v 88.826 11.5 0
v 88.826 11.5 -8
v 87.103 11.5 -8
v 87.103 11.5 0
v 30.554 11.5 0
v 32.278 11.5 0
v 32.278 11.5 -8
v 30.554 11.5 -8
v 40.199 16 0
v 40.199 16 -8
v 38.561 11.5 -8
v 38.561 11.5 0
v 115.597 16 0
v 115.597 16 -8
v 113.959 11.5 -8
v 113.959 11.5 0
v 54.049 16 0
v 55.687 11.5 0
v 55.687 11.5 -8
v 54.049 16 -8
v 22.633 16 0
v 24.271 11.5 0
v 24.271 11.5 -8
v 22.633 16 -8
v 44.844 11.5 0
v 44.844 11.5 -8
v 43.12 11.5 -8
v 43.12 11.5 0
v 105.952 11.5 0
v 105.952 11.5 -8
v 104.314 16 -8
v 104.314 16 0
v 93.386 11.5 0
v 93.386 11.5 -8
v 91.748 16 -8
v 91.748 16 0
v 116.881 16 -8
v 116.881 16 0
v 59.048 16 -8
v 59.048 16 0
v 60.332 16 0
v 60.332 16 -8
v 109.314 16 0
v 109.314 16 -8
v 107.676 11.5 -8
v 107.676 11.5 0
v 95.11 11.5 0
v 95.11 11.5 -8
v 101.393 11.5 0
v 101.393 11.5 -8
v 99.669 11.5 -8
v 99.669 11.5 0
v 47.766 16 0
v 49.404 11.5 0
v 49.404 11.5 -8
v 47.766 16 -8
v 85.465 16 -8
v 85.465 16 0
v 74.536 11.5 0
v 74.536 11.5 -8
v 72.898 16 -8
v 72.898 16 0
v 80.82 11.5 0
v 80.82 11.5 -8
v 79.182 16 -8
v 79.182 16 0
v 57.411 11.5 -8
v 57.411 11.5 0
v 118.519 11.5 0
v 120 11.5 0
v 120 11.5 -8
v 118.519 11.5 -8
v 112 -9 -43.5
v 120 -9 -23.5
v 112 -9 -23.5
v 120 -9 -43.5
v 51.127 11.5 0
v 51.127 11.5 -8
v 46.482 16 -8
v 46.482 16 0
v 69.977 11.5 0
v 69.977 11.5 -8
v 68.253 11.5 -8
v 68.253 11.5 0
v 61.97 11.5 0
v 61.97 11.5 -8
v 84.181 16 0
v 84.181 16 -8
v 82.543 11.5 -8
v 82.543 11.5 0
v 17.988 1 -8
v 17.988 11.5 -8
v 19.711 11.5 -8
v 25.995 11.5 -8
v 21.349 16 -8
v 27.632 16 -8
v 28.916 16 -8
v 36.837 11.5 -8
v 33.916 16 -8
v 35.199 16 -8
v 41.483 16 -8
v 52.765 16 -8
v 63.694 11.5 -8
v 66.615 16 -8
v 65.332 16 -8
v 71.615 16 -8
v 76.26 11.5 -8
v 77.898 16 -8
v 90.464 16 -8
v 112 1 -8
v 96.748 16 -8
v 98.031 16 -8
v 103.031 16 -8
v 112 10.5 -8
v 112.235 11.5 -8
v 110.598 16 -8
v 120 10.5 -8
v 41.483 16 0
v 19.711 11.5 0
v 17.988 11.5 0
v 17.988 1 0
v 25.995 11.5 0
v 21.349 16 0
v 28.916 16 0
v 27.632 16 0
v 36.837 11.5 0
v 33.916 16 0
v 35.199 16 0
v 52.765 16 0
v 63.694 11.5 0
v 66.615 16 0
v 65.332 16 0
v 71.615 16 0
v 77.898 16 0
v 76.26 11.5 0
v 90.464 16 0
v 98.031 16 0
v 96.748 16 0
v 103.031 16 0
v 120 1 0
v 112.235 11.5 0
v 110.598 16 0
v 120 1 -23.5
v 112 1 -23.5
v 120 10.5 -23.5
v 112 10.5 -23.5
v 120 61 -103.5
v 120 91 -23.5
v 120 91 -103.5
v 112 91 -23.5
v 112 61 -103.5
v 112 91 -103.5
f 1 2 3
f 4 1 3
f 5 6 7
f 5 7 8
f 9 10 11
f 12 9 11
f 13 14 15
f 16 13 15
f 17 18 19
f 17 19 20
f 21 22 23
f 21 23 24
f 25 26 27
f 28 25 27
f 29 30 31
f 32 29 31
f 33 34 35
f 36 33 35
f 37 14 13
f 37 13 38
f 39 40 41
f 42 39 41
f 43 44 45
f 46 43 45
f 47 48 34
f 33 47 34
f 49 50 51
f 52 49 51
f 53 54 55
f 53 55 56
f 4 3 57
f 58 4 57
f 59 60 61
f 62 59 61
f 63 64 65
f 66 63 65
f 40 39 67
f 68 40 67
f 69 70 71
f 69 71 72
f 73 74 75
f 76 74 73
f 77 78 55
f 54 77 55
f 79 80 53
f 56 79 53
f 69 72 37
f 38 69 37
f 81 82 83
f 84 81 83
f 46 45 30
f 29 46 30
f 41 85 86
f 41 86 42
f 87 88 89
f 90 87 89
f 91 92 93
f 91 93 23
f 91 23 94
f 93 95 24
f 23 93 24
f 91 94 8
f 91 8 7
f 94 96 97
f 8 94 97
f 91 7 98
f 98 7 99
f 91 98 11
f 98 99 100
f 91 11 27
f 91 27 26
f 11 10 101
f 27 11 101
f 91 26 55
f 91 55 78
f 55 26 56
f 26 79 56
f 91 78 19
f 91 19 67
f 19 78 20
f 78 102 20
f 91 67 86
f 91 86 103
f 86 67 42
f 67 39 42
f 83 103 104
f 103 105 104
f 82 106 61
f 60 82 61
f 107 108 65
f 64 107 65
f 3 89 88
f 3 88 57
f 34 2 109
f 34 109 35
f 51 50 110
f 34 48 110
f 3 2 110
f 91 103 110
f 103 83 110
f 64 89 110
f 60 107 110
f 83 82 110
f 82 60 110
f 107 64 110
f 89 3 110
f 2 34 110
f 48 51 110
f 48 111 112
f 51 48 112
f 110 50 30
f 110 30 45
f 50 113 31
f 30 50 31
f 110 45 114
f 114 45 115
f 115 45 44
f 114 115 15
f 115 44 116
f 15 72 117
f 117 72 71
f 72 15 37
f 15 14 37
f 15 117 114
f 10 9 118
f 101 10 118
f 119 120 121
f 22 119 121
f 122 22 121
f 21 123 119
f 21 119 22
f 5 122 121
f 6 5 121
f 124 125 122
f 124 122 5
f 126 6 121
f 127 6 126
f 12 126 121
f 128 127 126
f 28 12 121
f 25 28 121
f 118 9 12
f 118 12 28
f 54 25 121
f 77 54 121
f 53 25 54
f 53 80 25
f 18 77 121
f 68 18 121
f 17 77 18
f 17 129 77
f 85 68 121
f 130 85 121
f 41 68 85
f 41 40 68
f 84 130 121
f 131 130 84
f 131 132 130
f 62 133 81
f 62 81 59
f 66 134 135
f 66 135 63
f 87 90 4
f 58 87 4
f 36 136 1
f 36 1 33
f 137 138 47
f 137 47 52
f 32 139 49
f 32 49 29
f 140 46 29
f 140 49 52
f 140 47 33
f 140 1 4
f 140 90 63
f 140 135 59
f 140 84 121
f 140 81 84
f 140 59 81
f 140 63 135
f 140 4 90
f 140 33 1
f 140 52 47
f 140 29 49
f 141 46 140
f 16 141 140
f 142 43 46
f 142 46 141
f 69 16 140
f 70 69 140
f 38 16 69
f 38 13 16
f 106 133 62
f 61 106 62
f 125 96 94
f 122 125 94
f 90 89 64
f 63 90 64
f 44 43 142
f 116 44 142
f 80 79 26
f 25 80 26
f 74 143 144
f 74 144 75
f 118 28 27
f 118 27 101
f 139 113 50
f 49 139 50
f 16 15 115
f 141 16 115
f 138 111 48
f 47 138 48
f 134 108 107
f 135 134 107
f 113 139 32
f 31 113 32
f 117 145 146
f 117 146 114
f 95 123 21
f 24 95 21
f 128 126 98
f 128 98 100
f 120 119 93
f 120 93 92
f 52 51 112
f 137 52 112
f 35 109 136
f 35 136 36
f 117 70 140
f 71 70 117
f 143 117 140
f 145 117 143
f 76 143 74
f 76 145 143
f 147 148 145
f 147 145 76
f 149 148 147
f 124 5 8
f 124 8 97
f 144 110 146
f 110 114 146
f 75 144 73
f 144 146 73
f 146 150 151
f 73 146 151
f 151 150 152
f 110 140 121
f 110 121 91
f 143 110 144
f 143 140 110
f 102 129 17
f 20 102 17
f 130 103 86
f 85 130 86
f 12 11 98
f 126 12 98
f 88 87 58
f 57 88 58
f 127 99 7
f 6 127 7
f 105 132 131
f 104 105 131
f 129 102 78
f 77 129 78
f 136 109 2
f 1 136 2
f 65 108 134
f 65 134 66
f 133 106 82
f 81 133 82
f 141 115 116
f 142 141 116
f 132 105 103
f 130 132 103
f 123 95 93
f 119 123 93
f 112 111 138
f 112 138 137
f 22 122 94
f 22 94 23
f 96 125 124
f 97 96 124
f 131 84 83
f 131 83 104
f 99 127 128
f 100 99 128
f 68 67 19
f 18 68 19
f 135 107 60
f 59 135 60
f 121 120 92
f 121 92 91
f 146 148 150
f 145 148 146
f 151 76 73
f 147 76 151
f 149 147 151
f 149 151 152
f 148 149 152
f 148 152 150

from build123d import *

# Parameters (mm, degrees)
BLANKSKE_W          = 120
BLANKSKE_H          = 16
BLANK_DEPTH         = 8
TOOTHCUTSIM_DEPTH   = 122.326007105
TEETHCUTS_COUNT     = 20
TEETHCUTS_PITCH     = 6.2831853
SKETCH1_W           = 8
SKETCH1_H           = 1
CUT_EXTRUDE1_DEPTH  = 122.326007105
BOSS_EXTRUDE2_DEPTH = 8
CUT_EXTRUDE2_DEPTH  = 183.738200713


with BuildPart() as part:
    # BlankSke → Blank (new body)
    with BuildSketch(Plane.XY):
        with Locations((60, 8)):
            Rectangle(BLANKSKE_W, BLANKSKE_H)
    extrude(amount=-BLANK_DEPTH)

    # TooCutSkeSim → ToothCutSim (cut, through all)
    with BuildSketch(Plane.XY):
        Polygon((0.861870739, 11.5), (-0.861870739, 11.5), (-2.508981637, 16.0254), (2.508981637, 16.0254), align=None)
    toothcutsim = extrude(amount=-TOOTHCUTSIM_DEPTH, mode=Mode.SUBTRACT)

    # TeethCuts: ToothCutSim ×20
    with Locations(*[(i * TEETHCUTS_PITCH, 0, 0) for i in range(1, TEETHCUTS_COUNT)]):
        add(toothcutsim, mode=Mode.SUBTRACT)

    # Sketch1 → Cut-Extrude1 (cut, through all)
    with BuildSketch(Plane(origin=(120, 0, 0), x_dir=(0, 0, -1), z_dir=(1, 0, 0))):
        with Locations((4, 0.5)):
            Rectangle(SKETCH1_W, SKETCH1_H)
    extrude(amount=-CUT_EXTRUDE1_DEPTH, mode=Mode.SUBTRACT)

    # Sketch2 → Boss-Extrude2 (add)
    with BuildSketch(Plane(origin=(120, 0, 0), x_dir=(0, 0, -1), z_dir=(1, 0, 0))):
        Polygon((8, 1), (23.5, 1), (23.5, -9), (43.5, -9), (103.5, 61), (103.5, 91), (23.5, 91), (23.5, 10.5), (8, 10.5), align=None)
    extrude(amount=-BOSS_EXTRUDE2_DEPTH)

    # Sketch3 → Cut-Extrude2 (cut, through all)
    with BuildSketch(Plane.XY):
        with BuildLine():
            Line((0, 1), (0, 11.5))
            ThreePointArc((0, 11.5), (0.43093537, 11.93093537), (0.861870739, 11.5))
            Line((0.861870739, 11.5), (2.499736794, 16))
            Line((2.499736794, 16), (3.783448506, 16))
            Line((3.783448506, 16), (5.421314561, 11.5))
            Line((5.421314561, 11.5), (7.145056039, 11.5))
            Line((7.145056039, 11.5), (8.782922094, 16))
            Line((8.782922094, 16), (10.066633806, 16))
            Line((10.066633806, 16), (11.704499861, 11.5))
            Line((11.704499861, 11.5), (13.428241339, 11.5))
            Line((13.428241339, 11.5), (15.066107394, 16))
            Line((15.066107394, 16), (15.70796325, 16))
            Line((15.70796325, 16), (16.349819106, 16))
            Line((16.349819106, 16), (17.987685161, 11.5))
            Line((17.987685161, 11.5), (17.987685161, 1))
            Line((17.987685161, 1), (15.70796325, 1))
            Line((15.70796325, 1), (6.161314561, 1))
            Line((6.161314561, 1), (0, 1))
        make_face()
    extrude(amount=-CUT_EXTRUDE2_DEPTH, mode=Mode.SUBTRACT)


solid = part.part
